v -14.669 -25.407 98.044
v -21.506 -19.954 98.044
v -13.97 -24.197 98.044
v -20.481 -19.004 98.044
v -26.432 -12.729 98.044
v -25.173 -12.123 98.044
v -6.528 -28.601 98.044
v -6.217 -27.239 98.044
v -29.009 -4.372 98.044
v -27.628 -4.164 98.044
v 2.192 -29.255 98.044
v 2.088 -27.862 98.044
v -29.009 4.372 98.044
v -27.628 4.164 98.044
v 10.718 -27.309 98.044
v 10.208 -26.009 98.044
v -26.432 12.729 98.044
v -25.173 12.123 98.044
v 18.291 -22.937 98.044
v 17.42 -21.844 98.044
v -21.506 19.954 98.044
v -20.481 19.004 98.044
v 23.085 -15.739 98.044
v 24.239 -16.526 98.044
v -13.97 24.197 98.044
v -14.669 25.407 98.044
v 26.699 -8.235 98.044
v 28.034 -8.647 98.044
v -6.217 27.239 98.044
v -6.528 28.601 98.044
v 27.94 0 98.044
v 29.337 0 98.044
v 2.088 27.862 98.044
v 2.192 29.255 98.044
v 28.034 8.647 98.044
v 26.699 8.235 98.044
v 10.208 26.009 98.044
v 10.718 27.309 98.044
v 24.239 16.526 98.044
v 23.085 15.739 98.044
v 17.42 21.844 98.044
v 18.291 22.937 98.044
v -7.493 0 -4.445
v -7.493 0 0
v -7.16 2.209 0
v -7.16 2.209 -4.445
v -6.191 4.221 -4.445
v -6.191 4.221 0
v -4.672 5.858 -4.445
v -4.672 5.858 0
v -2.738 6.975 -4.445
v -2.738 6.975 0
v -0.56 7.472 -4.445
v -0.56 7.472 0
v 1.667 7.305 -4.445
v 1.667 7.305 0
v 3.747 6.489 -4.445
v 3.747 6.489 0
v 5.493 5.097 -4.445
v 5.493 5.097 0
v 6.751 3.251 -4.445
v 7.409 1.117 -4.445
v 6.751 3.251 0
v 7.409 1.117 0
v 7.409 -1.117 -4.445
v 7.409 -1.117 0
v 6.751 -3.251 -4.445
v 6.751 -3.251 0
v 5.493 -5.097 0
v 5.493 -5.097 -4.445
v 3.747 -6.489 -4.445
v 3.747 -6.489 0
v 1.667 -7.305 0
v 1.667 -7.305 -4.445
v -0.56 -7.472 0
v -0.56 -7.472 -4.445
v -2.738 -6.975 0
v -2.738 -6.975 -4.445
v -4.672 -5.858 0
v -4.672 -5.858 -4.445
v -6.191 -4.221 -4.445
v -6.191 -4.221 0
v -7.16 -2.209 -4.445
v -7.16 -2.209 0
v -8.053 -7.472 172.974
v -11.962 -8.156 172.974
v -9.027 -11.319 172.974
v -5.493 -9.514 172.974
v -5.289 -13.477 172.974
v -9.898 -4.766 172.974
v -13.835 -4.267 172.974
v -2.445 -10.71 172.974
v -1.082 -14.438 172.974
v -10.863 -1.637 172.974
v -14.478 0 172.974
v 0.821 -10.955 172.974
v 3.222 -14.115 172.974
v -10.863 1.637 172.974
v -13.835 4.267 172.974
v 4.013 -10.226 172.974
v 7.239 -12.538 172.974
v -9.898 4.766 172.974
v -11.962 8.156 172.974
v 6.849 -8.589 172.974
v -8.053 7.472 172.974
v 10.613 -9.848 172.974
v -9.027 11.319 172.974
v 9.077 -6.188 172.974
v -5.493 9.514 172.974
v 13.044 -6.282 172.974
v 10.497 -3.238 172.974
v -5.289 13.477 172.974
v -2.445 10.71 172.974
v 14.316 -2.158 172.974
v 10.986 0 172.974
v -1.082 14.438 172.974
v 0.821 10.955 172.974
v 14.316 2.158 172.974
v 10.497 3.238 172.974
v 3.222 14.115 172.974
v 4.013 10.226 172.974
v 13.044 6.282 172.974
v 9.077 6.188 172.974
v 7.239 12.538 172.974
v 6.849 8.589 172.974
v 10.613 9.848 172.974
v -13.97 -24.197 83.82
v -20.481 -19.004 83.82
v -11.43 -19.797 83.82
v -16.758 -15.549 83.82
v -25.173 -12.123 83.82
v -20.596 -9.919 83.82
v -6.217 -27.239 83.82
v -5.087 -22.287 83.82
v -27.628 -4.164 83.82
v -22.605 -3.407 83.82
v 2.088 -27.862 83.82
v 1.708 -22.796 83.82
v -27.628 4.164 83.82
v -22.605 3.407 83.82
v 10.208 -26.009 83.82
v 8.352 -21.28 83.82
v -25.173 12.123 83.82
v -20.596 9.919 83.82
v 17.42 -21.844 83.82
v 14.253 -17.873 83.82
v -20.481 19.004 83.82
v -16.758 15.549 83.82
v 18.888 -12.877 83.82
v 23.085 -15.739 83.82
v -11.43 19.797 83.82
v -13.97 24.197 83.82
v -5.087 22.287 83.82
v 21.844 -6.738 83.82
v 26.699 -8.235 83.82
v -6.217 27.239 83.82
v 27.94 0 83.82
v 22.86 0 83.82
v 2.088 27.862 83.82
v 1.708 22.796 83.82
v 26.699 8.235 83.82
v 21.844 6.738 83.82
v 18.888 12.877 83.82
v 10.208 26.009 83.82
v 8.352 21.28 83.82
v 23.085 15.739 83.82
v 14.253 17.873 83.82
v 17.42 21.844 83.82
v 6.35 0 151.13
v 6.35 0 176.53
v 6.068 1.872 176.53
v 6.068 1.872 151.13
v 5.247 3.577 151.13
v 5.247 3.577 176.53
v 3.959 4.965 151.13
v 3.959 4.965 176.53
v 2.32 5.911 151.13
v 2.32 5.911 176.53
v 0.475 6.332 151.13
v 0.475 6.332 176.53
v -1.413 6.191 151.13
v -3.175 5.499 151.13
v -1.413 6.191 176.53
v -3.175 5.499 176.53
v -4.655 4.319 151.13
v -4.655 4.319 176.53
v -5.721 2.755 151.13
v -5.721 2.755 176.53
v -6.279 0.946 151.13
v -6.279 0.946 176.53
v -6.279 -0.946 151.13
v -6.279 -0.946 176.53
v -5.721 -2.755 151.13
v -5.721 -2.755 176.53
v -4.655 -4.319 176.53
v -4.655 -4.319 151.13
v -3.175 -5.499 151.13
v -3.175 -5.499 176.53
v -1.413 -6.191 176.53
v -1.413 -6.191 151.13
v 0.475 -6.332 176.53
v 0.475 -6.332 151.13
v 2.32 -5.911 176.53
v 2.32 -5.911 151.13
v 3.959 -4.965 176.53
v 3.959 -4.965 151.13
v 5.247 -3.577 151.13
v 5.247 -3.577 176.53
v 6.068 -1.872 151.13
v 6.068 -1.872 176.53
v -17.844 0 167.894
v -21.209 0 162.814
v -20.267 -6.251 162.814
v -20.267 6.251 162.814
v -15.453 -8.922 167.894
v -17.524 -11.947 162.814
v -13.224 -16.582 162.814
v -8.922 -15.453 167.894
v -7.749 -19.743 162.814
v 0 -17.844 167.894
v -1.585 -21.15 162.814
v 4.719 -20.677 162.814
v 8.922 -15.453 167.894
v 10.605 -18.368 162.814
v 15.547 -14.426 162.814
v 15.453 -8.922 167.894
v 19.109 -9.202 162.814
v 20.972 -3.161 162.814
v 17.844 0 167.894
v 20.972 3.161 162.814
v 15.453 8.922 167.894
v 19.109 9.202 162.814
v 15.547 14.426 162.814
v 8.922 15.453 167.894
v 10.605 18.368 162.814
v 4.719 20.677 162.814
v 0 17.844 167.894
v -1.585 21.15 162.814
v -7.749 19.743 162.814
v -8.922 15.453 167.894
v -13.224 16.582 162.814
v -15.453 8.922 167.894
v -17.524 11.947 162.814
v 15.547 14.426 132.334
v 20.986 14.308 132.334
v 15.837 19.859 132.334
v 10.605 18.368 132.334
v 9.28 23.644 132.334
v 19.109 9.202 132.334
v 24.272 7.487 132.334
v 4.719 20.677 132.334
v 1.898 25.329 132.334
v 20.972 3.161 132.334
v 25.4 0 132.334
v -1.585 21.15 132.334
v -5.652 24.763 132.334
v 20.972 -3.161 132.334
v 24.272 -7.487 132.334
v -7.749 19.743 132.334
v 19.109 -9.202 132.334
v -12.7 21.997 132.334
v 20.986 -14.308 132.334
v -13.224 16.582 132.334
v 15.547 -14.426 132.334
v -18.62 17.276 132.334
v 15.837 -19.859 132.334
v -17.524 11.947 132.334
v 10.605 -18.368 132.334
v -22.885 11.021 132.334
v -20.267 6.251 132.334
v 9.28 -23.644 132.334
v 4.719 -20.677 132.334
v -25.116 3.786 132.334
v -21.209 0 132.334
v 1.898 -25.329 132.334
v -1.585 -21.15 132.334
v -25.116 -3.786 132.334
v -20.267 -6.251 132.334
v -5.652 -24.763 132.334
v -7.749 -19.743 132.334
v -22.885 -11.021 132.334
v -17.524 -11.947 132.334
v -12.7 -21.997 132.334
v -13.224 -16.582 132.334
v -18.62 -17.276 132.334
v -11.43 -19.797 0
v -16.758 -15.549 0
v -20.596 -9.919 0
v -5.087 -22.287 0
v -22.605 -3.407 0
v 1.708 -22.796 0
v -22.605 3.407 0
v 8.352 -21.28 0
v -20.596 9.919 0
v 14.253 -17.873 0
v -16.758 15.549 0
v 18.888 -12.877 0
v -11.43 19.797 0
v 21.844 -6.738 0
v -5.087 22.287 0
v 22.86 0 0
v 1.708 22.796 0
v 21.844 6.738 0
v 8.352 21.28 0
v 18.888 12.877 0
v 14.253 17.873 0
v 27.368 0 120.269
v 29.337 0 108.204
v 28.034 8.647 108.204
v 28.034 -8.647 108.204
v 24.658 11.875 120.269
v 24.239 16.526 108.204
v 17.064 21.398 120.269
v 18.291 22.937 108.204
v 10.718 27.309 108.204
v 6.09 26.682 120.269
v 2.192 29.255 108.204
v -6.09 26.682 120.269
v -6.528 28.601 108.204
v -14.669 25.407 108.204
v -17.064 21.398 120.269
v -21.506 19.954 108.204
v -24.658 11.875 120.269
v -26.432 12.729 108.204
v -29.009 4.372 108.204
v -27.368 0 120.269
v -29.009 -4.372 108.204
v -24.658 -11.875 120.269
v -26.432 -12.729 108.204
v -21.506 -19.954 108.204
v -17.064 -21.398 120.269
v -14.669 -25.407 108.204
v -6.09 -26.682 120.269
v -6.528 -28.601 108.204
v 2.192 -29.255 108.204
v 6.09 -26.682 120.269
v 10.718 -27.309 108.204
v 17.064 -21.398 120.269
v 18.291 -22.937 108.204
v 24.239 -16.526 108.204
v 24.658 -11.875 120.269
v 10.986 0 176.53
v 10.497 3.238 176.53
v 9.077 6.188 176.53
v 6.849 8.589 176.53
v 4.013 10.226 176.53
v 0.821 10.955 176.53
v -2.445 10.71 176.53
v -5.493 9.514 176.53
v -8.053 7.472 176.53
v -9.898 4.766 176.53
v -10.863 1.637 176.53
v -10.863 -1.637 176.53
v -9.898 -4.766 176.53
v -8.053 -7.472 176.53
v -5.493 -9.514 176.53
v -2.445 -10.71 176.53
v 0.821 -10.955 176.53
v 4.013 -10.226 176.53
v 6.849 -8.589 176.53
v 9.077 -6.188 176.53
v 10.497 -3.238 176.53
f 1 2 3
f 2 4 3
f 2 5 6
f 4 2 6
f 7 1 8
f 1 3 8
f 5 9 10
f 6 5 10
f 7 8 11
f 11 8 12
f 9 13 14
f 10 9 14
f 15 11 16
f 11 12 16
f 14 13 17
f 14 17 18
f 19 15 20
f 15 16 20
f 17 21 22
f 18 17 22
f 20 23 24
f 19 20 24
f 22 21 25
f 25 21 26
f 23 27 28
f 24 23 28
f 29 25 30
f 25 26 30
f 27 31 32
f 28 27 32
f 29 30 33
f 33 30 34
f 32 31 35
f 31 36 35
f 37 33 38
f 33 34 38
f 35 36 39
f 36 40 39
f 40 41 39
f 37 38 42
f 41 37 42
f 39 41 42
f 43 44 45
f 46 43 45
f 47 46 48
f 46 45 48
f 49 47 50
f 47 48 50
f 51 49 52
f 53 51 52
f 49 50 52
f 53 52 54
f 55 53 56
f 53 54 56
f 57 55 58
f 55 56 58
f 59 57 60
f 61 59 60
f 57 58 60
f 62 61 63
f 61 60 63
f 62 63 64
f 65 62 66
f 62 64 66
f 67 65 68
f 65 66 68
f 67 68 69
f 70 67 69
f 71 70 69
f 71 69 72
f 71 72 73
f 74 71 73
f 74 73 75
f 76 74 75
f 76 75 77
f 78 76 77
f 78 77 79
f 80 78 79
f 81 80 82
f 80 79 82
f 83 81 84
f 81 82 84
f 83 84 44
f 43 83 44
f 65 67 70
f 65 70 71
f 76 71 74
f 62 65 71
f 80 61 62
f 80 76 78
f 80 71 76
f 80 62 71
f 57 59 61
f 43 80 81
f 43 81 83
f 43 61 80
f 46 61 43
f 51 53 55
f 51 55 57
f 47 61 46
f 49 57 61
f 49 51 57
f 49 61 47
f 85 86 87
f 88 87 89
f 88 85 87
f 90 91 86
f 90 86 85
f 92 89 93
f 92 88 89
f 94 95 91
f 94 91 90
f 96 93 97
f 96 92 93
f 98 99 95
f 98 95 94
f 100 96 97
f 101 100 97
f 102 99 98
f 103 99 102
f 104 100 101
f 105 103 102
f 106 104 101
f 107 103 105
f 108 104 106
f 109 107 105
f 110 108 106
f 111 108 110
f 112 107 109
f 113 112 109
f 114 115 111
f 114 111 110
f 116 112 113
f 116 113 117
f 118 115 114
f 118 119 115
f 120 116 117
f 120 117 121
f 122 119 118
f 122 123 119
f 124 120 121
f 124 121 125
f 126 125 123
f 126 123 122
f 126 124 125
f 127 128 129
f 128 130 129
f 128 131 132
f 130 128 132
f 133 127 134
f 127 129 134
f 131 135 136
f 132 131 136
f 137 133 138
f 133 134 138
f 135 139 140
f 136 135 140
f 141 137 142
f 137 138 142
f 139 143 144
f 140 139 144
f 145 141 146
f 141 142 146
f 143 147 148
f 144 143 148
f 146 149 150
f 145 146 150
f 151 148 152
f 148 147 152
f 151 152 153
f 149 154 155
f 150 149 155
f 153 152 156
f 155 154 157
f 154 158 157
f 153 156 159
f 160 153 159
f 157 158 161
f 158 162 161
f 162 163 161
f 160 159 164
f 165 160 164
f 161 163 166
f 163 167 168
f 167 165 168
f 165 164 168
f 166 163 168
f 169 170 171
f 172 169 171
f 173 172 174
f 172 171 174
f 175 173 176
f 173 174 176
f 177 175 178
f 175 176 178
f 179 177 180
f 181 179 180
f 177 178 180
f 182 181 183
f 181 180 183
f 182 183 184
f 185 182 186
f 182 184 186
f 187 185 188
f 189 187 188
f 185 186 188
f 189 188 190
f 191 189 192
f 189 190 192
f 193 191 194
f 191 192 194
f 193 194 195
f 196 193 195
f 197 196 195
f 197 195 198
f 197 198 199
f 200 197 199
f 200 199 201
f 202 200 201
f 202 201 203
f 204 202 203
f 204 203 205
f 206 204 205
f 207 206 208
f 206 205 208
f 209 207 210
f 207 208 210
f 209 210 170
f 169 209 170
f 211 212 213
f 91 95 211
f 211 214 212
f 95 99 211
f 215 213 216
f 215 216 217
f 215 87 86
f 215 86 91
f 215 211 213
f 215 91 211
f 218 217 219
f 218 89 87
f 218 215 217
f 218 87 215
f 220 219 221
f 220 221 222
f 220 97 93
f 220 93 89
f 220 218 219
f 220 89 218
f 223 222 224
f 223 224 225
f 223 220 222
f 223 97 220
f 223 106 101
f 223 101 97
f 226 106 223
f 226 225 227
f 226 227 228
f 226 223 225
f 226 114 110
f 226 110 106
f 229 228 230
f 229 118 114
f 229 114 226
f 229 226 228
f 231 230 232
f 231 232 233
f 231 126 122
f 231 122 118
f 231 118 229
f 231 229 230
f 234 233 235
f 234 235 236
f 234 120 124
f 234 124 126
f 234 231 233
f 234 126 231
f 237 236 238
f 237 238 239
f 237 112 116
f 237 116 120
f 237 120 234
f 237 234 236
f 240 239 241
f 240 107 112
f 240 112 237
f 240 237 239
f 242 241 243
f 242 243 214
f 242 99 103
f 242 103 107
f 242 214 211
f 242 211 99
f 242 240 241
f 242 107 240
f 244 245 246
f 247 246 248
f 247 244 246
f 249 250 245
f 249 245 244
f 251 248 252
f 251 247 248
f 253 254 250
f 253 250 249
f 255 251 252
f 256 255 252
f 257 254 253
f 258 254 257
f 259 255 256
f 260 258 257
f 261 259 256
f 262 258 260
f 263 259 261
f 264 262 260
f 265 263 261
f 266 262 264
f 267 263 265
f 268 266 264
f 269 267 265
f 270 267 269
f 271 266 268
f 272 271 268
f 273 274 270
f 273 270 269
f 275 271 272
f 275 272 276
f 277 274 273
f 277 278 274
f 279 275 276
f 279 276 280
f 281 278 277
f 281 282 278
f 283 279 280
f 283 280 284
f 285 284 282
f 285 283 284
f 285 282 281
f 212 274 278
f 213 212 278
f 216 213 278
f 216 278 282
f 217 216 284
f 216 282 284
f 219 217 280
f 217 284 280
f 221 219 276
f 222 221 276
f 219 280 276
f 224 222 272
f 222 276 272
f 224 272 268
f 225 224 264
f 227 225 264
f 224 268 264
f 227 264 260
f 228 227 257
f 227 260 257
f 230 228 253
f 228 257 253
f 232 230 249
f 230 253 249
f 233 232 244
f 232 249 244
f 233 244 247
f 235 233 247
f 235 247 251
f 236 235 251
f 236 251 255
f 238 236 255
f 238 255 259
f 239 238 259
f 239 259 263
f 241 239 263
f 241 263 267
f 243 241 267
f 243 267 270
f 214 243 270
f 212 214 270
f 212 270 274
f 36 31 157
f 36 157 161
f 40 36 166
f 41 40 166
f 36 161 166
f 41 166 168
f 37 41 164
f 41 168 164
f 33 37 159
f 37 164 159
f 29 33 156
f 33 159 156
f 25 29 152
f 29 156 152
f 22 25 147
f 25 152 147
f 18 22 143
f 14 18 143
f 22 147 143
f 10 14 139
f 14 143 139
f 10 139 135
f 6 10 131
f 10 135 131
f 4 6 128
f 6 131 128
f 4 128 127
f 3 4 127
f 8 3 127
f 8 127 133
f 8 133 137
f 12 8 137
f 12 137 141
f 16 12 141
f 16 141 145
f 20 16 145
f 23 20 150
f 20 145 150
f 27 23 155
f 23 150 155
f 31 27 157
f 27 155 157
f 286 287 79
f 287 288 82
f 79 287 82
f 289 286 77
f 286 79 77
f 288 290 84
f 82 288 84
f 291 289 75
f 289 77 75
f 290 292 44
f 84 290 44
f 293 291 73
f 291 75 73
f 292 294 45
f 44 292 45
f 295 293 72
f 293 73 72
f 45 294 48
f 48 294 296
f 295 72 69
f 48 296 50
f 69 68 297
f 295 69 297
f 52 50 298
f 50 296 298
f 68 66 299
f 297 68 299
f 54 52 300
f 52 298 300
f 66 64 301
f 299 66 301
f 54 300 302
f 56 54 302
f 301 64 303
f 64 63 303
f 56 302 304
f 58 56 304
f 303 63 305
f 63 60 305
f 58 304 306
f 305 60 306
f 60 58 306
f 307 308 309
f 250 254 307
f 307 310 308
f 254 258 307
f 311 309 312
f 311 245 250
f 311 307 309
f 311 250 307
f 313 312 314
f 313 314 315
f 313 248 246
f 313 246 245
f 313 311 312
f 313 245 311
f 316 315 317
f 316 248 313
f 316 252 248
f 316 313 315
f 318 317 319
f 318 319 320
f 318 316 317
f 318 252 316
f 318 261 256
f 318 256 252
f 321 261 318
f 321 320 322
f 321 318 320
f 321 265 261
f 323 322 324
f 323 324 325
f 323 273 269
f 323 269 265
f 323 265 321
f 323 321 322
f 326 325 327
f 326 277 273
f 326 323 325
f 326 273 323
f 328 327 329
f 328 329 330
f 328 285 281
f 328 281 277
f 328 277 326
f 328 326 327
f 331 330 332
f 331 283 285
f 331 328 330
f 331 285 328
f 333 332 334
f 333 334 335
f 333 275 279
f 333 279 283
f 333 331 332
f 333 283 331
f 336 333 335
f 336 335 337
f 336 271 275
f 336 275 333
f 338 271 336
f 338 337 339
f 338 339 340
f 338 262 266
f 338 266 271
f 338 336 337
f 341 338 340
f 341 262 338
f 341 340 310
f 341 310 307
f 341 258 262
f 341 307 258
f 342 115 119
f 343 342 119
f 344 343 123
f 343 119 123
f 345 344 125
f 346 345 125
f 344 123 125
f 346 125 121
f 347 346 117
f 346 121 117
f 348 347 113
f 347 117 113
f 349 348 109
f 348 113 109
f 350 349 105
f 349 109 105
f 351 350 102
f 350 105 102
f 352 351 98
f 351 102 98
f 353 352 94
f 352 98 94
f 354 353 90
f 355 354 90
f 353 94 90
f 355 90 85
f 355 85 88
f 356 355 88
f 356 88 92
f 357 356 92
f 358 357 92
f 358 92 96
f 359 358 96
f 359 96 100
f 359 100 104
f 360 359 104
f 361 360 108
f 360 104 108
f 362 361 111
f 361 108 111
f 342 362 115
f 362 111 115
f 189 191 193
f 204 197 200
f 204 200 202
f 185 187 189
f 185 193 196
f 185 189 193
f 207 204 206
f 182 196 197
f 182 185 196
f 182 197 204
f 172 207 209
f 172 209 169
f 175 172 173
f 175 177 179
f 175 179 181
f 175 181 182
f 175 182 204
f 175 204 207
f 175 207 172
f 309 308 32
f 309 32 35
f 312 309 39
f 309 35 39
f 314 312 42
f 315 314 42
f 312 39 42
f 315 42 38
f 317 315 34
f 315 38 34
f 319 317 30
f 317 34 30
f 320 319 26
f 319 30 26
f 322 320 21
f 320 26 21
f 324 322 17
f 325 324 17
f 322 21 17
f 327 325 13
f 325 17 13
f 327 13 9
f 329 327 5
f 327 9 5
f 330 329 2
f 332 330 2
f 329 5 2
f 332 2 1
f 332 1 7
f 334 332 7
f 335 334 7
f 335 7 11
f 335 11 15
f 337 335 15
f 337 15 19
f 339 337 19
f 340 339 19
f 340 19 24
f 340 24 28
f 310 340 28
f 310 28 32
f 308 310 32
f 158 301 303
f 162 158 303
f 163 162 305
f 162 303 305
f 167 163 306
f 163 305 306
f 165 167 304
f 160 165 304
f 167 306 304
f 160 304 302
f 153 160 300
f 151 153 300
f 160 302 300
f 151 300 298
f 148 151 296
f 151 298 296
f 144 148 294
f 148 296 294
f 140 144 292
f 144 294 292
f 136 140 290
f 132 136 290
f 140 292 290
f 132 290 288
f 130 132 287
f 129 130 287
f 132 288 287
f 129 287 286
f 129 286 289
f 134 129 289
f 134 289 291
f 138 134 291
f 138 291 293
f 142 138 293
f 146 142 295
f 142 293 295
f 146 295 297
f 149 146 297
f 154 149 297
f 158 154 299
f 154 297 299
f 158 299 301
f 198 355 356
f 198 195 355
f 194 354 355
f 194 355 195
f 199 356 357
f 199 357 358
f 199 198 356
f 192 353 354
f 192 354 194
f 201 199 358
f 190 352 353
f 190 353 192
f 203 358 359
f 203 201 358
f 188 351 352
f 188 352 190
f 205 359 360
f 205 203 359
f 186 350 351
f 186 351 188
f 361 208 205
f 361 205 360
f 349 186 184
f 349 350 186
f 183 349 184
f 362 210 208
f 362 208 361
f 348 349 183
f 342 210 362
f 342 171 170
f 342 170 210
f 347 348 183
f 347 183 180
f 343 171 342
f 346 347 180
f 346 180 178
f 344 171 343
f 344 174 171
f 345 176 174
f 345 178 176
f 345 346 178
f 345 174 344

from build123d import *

# Parameters (mm, degrees)
SKETCH2_R           = 22.86
BOSS_EXTRUDE1_DEPTH = 83.82
SKETCH3_R           = 27.94
BOSS_EXTRUDE2_DEPTH = 14.224
SKETCH4_R           = 7.493
BOSS_EXTRUDE3_DEPTH = 4.445
SKETCH5_R           = 29.337
BOSS_EXTRUDE4_DEPTH = 10.16
SKETCH6_R           = 25.4
BOSS_EXTRUDE5_DEPTH = 24.13
SKETCH7_R           = 21.209
BOSS_EXTRUDE6_DEPTH = 30.48
SKETCH8_R           = 14.478
BOSS_EXTRUDE7_DEPTH = 10.16
SKETCH9_R           = 10.9855
BOSS_EXTRUDE8_DEPTH = 3.556
SKETCH10_R          = 6.35
CUT_EXTRUDE1_DEPTH  = 25.4


with BuildPart() as part:
    # Sketch2 → Boss-Extrude1 (new body)
    with BuildSketch(Plane.XY):
        Circle(SKETCH2_R)
    extrude(amount=BOSS_EXTRUDE1_DEPTH)

    # Sketch3 → Boss-Extrude2 (add)
    with BuildSketch(Plane.XY.offset(83.82)):
        Circle(SKETCH3_R)
    extrude(amount=BOSS_EXTRUDE2_DEPTH)

    # Sketch4 → Boss-Extrude3 (add)
    with BuildSketch(Plane(origin=(0, 0, 0), x_dir=(-1, 0, 0), z_dir=(0, 0, -1))):
        Circle(SKETCH4_R)
    extrude(amount=BOSS_EXTRUDE3_DEPTH)

    # Sketch5 → Boss-Extrude4 (add)
    with BuildSketch(Plane.XY.offset(98.044)):
        Circle(SKETCH5_R)
    extrude(amount=BOSS_EXTRUDE4_DEPTH)

    # Sketch6 → Boss-Extrude5 (add)
    with BuildSketch(Plane.XY.offset(108.204)):
        with Locations(Location((0, 0, 0), (0, 0, 180))):
            Circle(SKETCH6_R)
    extrude(amount=BOSS_EXTRUDE5_DEPTH)

    # loft up to a face of the part (loft1)
    loft([Face(Wire([part.edges().sort_by_distance((-20.082558447, 21.385752623, 108.204))[0]])), Face(Wire([part.edges().sort_by_distance((17.387496491, -18.515803137, 132.334))[0]]))])

    # Sketch7 → Boss-Extrude6 (add)
    with BuildSketch(Plane.XY.offset(132.334)):
        with Locations(Location((0, 0, 0), (0, 0, 180))):
            Circle(SKETCH7_R)
    extrude(amount=BOSS_EXTRUDE6_DEPTH)

    # Sketch8 → Boss-Extrude7 (add)
    with BuildSketch(Plane.XY.offset(162.814)):
        Circle(SKETCH8_R)
    extrude(amount=BOSS_EXTRUDE7_DEPTH)

    # Sketch9 → Boss-Extrude8 (add)
    with BuildSketch(Plane.XY.offset(172.974)):
        Circle(SKETCH9_R)
    extrude(amount=BOSS_EXTRUDE8_DEPTH)

    # loft up to a face of the part (loft2)
    loft([Face(Wire([part.edges().sort_by_distance((14.51855957, -15.460695619, 162.814))[0]])), Face(Wire([part.edges().sort_by_distance((-9.910873, 10.554007788, 172.974))[0]]))])

    # Sketch10 → Cut-Extrude1 (cut)
    with BuildSketch(Plane.XY.offset(176.53)):
        Circle(SKETCH10_R)
    extrude(amount=-CUT_EXTRUDE1_DEPTH, mode=Mode.SUBTRACT)


solid = part.part
